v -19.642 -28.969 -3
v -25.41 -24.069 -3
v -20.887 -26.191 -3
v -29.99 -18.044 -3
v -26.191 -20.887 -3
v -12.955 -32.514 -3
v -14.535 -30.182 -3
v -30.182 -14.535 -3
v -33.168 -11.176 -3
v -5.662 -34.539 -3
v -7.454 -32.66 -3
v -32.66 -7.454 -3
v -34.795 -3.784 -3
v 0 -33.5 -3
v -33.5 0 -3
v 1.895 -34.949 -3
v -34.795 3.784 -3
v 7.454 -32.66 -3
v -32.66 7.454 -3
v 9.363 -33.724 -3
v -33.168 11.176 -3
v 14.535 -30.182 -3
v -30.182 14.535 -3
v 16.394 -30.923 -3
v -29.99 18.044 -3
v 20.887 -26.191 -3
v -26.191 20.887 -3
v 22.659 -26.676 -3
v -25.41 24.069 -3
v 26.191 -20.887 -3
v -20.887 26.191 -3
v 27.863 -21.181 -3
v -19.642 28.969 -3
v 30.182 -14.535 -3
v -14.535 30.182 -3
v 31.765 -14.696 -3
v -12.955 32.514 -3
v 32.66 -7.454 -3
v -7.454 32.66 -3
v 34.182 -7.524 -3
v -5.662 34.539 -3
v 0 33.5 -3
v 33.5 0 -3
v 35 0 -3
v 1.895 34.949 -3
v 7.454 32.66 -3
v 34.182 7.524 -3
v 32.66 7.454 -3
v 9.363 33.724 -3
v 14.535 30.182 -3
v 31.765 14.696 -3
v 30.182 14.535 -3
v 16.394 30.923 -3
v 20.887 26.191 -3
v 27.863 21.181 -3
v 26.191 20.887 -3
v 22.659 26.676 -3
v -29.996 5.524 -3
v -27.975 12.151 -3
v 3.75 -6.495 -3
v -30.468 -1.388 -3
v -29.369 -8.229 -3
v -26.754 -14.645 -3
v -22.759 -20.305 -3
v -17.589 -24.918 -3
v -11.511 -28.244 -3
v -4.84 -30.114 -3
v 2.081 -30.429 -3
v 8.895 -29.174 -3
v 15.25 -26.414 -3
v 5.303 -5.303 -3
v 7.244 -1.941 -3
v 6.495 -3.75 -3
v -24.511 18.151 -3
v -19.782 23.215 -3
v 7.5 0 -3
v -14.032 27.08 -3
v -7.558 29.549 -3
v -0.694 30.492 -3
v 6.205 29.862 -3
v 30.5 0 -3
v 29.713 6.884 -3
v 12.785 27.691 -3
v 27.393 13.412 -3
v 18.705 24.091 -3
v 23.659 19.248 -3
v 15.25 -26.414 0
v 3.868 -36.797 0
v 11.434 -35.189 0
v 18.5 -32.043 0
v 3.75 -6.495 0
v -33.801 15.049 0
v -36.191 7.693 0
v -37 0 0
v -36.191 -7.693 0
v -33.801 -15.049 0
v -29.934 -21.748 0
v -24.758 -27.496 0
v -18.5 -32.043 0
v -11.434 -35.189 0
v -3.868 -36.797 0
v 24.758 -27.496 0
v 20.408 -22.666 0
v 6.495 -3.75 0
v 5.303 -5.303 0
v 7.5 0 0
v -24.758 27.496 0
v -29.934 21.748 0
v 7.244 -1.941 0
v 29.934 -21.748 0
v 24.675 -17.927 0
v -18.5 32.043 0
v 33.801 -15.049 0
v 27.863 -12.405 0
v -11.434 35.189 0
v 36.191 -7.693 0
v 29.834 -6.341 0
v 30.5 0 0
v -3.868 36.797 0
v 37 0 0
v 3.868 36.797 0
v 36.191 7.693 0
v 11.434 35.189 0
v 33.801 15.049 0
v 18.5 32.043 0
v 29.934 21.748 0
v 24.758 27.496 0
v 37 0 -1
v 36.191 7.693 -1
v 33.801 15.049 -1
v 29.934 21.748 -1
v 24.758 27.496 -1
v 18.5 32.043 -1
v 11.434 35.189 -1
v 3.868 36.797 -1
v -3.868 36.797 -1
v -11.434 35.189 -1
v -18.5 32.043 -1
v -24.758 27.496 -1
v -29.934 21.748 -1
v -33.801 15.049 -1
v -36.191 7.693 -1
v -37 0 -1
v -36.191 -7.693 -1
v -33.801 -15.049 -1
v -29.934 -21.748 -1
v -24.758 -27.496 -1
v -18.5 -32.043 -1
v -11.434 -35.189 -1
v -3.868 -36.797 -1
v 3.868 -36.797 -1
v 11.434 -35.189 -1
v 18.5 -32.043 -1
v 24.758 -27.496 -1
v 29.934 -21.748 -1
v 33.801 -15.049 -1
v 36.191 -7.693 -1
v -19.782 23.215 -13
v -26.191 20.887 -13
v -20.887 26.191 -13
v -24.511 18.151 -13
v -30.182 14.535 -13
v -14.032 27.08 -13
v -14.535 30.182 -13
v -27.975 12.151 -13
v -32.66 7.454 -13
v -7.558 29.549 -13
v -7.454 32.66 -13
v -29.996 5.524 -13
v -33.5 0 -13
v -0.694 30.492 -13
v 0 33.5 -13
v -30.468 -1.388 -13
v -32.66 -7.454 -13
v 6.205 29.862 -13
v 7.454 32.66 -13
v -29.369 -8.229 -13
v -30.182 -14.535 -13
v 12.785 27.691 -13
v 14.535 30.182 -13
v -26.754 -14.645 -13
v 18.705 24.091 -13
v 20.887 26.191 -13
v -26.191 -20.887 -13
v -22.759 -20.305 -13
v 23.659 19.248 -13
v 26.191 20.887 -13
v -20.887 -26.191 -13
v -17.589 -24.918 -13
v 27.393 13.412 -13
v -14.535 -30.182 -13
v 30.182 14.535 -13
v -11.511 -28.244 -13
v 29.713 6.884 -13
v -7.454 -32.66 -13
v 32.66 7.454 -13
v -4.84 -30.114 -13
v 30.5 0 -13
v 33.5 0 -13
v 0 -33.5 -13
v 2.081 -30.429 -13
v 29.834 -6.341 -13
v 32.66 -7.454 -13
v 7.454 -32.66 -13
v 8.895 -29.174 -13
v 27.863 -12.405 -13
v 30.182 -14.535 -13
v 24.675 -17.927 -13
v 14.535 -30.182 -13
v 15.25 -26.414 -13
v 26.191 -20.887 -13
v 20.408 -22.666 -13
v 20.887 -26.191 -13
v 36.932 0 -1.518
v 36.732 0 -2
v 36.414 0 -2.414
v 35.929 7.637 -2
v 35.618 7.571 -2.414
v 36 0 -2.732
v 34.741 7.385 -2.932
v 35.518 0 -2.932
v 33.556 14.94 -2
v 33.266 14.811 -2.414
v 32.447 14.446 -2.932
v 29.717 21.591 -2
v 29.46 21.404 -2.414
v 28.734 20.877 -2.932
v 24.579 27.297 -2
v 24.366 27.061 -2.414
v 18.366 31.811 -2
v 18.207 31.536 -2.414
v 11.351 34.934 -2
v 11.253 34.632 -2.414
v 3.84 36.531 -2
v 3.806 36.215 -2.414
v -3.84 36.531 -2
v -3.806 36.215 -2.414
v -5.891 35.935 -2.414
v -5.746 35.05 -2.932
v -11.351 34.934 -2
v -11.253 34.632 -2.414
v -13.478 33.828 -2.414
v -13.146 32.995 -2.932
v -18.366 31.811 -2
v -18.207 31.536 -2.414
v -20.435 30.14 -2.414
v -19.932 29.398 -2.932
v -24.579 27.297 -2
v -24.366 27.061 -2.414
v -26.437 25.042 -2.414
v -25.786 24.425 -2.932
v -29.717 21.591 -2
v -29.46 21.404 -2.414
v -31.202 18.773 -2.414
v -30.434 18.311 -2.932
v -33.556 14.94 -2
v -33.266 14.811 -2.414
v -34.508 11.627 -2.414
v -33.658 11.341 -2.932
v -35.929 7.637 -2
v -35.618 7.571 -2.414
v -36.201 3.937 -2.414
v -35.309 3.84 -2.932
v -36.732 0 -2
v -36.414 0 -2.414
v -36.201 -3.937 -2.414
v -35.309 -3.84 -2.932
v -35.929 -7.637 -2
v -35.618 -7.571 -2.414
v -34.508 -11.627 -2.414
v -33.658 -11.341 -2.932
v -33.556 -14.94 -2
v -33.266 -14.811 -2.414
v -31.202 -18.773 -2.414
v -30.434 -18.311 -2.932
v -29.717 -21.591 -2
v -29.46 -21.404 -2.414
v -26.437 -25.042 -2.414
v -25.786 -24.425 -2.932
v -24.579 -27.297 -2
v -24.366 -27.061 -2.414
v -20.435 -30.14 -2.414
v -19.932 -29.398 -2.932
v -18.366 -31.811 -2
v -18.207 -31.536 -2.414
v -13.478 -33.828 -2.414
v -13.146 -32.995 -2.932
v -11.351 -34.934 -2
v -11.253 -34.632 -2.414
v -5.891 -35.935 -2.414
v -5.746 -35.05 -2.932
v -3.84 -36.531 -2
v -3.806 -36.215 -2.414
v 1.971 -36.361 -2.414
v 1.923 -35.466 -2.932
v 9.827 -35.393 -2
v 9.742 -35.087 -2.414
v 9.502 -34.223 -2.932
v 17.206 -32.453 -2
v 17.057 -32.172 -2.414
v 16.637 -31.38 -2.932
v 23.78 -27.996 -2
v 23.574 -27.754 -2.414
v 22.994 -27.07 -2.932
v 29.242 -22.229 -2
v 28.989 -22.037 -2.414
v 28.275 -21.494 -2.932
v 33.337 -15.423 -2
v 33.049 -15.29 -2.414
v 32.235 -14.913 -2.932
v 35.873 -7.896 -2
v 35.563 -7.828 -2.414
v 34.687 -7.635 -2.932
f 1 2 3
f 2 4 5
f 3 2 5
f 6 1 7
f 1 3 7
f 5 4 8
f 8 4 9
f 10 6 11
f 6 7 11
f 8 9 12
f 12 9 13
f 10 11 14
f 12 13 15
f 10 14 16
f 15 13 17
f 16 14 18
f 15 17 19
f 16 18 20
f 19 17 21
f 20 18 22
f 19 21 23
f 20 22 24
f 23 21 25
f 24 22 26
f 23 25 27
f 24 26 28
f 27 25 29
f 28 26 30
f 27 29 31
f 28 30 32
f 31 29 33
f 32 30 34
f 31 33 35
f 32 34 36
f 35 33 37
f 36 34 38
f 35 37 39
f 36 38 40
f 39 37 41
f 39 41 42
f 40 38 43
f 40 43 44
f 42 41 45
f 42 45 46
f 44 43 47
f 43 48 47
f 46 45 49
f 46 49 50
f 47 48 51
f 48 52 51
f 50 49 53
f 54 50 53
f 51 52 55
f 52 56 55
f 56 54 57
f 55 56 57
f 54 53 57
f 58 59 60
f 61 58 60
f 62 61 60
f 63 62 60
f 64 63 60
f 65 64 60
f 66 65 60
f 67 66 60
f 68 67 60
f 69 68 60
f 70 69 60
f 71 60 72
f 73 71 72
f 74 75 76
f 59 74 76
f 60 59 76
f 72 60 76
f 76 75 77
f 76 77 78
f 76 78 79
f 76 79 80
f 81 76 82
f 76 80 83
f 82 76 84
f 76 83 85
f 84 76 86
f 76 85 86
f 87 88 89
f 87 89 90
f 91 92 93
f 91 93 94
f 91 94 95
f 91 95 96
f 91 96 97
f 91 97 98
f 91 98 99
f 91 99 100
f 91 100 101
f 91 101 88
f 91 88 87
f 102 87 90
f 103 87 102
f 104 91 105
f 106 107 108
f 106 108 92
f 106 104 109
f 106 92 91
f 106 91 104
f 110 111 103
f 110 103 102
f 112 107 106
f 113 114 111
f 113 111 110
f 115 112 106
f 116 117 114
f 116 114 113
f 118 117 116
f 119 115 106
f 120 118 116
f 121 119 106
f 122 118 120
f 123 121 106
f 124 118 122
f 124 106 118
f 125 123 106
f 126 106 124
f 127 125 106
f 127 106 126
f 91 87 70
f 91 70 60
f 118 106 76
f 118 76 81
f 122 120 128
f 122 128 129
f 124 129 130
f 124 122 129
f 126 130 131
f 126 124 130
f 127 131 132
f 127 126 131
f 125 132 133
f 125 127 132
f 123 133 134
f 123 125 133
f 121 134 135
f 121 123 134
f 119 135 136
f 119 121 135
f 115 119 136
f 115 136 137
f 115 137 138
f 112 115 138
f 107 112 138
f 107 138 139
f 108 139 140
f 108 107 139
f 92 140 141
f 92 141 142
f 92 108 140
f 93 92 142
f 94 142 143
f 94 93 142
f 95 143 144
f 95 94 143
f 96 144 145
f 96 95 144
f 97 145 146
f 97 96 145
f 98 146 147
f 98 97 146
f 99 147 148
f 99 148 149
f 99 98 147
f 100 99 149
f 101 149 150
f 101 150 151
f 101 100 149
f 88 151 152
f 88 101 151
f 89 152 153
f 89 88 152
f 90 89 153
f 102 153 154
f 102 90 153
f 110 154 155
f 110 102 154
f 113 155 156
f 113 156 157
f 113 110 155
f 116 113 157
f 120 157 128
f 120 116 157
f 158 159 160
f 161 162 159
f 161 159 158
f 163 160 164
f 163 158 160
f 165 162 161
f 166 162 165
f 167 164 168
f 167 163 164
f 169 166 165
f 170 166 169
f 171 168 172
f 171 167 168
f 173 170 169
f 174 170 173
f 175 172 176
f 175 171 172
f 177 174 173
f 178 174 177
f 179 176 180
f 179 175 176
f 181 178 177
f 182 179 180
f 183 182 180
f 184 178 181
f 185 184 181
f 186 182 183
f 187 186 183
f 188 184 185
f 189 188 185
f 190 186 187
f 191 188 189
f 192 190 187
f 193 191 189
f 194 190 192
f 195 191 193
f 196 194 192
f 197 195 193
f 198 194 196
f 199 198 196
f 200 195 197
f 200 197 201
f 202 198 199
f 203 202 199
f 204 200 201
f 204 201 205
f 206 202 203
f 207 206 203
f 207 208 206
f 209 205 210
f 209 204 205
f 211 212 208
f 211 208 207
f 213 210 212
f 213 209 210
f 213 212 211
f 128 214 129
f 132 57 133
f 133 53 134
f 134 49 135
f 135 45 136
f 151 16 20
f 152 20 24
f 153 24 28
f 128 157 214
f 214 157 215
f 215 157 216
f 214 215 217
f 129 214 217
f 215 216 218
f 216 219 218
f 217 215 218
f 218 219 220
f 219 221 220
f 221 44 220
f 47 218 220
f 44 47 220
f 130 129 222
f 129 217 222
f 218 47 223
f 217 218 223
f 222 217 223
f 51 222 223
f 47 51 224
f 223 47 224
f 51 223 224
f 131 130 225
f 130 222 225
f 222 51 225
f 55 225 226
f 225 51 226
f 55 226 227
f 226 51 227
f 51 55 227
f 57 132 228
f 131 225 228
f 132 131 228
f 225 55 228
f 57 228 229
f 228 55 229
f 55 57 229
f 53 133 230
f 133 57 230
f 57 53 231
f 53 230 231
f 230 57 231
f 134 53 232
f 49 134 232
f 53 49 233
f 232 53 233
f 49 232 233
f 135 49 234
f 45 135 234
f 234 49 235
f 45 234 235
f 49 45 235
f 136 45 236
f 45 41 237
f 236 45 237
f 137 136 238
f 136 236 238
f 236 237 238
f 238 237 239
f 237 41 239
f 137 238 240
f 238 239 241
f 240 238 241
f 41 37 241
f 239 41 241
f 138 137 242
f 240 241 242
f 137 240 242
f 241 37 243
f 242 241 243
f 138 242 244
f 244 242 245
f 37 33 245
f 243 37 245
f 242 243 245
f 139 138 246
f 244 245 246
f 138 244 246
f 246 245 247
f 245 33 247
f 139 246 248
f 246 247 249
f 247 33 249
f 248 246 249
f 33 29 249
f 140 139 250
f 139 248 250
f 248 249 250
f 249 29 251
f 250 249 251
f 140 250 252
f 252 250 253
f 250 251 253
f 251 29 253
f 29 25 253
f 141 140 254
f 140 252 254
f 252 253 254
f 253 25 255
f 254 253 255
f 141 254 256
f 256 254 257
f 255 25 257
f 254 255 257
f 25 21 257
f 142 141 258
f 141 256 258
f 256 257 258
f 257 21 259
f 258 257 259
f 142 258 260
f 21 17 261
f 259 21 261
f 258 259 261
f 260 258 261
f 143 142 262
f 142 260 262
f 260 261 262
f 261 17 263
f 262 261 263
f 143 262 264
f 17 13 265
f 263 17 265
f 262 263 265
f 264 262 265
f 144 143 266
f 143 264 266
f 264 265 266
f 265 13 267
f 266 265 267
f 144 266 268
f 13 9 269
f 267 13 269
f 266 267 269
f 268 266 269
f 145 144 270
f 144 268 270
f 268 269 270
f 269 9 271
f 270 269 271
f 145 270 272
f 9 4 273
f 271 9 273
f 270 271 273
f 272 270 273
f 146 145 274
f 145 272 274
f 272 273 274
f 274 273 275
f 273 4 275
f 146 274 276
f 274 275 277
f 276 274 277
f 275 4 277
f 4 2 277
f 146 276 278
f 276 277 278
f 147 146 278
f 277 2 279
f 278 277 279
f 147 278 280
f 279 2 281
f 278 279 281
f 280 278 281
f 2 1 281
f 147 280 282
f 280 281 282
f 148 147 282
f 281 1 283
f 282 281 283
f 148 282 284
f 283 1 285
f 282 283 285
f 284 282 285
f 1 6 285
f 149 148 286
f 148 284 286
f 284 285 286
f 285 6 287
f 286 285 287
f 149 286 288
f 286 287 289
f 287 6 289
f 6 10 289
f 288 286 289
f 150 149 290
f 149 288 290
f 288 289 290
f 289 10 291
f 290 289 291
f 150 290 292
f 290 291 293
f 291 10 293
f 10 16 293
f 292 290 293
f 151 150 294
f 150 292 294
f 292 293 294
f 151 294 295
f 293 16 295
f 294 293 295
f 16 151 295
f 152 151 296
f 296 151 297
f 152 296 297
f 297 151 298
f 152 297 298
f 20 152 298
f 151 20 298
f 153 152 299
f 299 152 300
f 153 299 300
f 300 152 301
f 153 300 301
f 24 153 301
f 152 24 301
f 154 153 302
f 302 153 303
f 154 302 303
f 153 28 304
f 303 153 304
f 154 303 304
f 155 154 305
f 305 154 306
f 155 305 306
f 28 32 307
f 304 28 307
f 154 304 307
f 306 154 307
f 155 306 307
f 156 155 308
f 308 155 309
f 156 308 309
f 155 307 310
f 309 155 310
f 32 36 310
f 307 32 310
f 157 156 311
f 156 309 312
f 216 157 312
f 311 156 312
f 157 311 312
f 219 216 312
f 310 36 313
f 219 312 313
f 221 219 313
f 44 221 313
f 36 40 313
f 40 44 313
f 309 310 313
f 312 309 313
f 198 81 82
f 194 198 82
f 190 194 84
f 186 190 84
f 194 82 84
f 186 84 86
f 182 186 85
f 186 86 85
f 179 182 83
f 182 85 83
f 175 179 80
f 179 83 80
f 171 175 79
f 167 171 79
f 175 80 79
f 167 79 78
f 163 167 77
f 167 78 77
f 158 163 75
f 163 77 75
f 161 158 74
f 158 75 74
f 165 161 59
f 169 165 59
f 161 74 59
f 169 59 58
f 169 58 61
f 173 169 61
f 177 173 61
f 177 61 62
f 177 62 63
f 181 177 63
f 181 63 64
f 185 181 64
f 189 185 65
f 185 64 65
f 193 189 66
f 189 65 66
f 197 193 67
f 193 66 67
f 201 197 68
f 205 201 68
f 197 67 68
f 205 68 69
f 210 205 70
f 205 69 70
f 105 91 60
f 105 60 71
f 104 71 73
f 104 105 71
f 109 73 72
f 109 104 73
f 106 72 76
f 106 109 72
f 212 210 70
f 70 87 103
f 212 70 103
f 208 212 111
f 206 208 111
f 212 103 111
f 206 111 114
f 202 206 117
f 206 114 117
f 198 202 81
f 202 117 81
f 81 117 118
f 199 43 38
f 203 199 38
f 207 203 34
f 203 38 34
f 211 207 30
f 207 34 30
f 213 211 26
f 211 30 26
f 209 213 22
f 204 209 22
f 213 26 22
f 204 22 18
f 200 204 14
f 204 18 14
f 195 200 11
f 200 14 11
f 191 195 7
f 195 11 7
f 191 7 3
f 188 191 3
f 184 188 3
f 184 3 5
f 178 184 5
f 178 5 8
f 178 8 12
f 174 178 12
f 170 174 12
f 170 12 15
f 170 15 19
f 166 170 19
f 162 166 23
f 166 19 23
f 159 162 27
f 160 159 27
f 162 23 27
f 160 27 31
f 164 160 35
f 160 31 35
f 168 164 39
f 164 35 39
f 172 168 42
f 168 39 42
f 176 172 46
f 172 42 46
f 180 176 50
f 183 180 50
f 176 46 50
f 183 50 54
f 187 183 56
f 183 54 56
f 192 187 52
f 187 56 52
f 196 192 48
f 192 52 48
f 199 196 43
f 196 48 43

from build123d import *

# Parameters (mm, degrees)
F0_R     = 37
F1_DEPTH = 3
F2_R     = 2
F3_R     = 33.5
F4_DEPTH = 10


with BuildPart() as f1:
    # F0 (on Top) → F1 (new body)
    with BuildSketch(Plane.XY):
        Circle(F0_R)
        with BuildLine():
            ThreePointArc((16.75, -29.0118510268), (-29.0118510268, 16.75), (33.5, 0))
            ThreePointArc((33.5, 0), (29.0118510268, -16.75), (16.75, -29.0118510268))
        make_face(mode=Mode.SUBTRACT)
        with BuildLine():
            Line((7.5, 0), (30.5, 0))
            ThreePointArc((30.5, 0), (-26.4137748154, 15.25), (15.25, -26.4137748154))
            Line((15.25, -26.4137748154), (3.75, -6.4951905284))
            ThreePointArc((3.75, -6.4951905284), (-6.4951905284, 3.75), (7.5, 0))
        make_face()
        with BuildLine():
            Line((30.5, 0), (33.5, 0))
            ThreePointArc((33.5, 0), (-29.0118510268, 16.75), (16.75, -29.0118510268))
            Line((16.75, -29.0118510268), (15.25, -26.4137748154))
            ThreePointArc((15.25, -26.4137748154), (-26.4137748154, 15.25), (30.5, 0))
        make_face()
        with BuildLine():
            ThreePointArc((3.75, -6.4951905284), (6.4951905284, -3.75), (7.5, 0))
            ThreePointArc((7.5, 0), (-6.4951905284, 3.75), (3.75, -6.4951905284))
        make_face()
        with BuildLine():
            ThreePointArc((16.75, -29.0118510268), (29.0118510268, -16.75), (33.5, 0))
            Line((33.5, 0), (30.5, 0))
            ThreePointArc((30.5, 0), (26.4137748154, -15.25), (15.25, -26.4137748154))
            Line((15.25, -26.4137748154), (16.75, -29.0118510268))
        make_face()
    extrude(amount=-F1_DEPTH)

    # F2
    f2_edges = [f1.edges().sort_by_distance(p)[0] for p in [
        (-37, 0, -3),
    ]]
    fillet(f2_edges, radius=F2_R)

    # F3 (on face) → F4 (join)
    with BuildSketch(Plane(origin=(0, 0, -3), x_dir=(1, 0, 0), z_dir=(0, 0, -1))):
        Circle(F3_R)
        with BuildLine():
            ThreePointArc((15.25, 26.4137748154), (26.4137748154, 15.25), (30.5, 0))
            ThreePointArc((30.5, 0), (-26.4137748154, -15.25), (15.25, 26.4137748154))
        make_face(mode=Mode.SUBTRACT)
    extrude(amount=F4_DEPTH)


solid = f1.part
